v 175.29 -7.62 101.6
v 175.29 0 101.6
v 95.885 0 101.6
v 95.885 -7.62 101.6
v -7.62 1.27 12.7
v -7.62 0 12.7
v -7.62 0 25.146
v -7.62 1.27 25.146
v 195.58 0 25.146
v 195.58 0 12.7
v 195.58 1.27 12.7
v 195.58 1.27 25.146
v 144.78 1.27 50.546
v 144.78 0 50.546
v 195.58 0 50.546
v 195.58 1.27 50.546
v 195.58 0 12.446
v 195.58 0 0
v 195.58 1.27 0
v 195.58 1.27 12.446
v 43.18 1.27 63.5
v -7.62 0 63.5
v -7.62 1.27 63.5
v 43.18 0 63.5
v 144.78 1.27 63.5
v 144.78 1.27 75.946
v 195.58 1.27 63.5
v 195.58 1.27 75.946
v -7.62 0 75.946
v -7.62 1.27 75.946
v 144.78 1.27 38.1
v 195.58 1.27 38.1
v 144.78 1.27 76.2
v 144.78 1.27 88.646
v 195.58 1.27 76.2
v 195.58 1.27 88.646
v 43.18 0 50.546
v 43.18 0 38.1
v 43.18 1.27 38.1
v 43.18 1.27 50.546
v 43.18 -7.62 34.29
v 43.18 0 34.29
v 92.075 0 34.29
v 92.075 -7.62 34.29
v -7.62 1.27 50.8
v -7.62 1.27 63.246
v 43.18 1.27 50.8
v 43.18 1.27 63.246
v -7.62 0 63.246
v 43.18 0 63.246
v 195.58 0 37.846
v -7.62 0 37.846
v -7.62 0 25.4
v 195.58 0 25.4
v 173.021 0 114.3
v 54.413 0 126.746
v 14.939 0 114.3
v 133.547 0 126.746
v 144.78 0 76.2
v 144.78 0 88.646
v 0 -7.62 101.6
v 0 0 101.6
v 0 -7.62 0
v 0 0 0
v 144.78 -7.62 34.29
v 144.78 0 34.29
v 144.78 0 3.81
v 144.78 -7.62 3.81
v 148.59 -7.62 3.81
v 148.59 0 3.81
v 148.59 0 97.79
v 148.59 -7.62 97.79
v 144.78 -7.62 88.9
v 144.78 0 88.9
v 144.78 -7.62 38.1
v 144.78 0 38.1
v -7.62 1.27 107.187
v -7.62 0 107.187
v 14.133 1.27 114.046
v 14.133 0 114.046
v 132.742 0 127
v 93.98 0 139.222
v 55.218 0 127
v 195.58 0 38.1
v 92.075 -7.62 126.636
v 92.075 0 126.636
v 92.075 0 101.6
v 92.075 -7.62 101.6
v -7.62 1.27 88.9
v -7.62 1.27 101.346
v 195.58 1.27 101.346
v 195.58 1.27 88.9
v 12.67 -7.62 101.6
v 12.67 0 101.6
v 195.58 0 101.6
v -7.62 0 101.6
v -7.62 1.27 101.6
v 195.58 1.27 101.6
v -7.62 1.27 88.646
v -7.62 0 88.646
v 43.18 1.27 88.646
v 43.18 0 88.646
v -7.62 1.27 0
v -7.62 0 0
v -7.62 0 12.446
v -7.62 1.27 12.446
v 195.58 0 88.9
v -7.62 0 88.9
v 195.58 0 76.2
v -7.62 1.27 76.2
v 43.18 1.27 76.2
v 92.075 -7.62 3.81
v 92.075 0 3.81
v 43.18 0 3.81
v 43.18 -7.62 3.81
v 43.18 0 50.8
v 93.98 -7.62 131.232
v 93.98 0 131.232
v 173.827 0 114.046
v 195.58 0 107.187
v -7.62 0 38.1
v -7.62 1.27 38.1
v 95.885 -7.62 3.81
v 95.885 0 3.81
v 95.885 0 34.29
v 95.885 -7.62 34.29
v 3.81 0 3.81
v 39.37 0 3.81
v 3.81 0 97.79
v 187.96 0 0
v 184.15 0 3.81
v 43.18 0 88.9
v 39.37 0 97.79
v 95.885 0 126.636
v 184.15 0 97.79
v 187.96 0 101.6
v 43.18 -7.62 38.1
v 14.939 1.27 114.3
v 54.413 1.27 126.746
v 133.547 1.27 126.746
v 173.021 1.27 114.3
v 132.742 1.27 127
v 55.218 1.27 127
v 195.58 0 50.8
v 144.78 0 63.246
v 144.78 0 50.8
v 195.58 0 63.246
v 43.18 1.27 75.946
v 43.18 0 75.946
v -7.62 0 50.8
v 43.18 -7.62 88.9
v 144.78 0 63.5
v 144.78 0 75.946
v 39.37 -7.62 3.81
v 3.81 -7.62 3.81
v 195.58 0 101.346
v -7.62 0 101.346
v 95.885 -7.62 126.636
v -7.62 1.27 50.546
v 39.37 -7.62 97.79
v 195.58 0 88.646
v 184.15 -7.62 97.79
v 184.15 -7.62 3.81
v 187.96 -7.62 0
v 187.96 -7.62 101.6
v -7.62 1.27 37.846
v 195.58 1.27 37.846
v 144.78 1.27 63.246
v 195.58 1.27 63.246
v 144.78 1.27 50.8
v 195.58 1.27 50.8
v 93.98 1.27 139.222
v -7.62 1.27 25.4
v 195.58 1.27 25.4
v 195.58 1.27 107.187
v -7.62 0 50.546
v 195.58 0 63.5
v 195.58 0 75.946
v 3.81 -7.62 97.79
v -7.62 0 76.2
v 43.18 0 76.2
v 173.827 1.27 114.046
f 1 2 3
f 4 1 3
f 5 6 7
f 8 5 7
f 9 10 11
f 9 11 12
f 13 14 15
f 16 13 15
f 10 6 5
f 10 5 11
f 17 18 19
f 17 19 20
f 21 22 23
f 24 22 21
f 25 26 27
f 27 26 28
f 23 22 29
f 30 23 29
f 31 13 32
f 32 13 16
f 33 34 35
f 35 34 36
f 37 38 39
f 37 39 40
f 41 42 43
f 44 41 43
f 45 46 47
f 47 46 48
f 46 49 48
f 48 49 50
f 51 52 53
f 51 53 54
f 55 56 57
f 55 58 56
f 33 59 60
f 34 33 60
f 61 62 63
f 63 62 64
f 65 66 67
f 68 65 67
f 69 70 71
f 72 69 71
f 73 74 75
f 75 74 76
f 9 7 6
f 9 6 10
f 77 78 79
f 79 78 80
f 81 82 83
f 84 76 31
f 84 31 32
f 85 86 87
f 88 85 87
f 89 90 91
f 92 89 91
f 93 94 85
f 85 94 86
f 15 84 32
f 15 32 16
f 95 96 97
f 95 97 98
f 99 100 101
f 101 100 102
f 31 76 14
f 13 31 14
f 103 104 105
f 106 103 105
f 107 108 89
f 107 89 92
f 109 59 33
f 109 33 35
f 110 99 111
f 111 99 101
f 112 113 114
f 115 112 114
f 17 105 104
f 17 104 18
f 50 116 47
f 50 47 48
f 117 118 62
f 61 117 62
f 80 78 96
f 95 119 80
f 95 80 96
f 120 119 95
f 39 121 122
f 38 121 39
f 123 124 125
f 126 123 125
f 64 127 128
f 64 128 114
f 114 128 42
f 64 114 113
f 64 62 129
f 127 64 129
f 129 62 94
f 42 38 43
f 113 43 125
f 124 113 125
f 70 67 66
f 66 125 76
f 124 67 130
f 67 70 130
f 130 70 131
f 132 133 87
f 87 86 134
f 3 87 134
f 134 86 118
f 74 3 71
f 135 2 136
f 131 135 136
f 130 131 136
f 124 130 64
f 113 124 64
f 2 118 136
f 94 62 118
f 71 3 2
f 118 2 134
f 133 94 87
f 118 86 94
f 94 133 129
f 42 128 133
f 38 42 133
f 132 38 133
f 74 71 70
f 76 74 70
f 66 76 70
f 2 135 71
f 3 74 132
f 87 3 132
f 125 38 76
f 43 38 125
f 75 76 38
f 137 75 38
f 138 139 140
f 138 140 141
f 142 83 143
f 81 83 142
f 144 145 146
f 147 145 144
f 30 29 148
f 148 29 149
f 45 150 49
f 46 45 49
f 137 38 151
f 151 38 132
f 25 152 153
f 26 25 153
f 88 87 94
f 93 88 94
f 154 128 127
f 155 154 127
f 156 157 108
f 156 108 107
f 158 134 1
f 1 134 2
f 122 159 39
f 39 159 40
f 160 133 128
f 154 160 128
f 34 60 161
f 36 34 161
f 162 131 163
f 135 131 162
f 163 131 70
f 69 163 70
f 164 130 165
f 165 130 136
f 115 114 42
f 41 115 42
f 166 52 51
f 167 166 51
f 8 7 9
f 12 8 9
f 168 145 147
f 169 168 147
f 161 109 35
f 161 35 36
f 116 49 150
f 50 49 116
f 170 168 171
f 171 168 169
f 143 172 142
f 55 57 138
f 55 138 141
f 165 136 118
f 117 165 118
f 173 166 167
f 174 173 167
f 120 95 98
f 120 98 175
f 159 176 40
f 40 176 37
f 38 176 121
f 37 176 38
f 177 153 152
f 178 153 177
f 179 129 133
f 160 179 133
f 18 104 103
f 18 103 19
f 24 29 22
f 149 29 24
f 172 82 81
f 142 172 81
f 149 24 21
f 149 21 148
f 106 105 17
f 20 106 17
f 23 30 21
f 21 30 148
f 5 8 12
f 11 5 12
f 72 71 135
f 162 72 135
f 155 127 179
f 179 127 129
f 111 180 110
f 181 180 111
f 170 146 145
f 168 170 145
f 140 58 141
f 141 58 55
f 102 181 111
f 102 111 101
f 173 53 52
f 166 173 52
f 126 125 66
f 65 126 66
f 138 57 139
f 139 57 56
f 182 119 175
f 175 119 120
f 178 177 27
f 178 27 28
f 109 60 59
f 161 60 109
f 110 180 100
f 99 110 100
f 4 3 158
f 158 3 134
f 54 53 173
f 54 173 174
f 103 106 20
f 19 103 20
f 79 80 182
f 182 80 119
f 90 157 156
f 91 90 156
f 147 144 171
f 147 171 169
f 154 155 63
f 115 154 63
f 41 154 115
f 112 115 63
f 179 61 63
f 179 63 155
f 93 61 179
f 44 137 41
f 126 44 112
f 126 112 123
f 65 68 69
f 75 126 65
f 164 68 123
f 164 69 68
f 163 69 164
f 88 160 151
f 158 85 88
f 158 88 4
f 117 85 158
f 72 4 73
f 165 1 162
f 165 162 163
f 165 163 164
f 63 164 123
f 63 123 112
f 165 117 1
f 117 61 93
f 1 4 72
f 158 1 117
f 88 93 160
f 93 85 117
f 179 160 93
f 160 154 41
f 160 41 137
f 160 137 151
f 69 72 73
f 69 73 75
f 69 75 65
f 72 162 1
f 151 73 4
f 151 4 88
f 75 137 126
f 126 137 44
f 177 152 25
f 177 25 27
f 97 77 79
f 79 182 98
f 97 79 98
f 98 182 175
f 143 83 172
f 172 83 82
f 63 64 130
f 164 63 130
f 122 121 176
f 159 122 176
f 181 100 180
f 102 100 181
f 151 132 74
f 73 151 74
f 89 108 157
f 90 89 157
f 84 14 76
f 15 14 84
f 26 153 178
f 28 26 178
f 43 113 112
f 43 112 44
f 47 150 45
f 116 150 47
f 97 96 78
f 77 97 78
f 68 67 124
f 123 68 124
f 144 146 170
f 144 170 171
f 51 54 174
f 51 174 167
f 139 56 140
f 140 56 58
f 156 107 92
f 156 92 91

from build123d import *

# Parameters (mm, degrees)
F0_W     = 3.81
F0_H     = 93.98
F0_W_2   = 101.6
F0_H_2   = 3.81
F0_H_3   = 30.48
F0_H_4   = 5.08
F1_DEPTH = 7.62
F2_W     = 203.2
F2_H     = 12.446
F3_DEPTH = 1.27
F0_H_5   = 50.8
F4_DEPTH = 25.4
F6_DEPTH = 2.54


# Not quite as in the source:
# - a feature names something its author has since deleted; it is built from what else it names


with BuildPart() as f1:
    # F0 (on Front) → F1 (new body)
    with BuildSketch(Plane.XZ):
        Polygon((0, 101.6), (0, 97.79), (3.81, 97.79), (39.3699984628, 97.79), (43.18, 97.79), (144.78, 97.79), (148.59, 97.79), (184.15, 97.79), (187.96, 97.79), (187.96, 101.6), (175.2898087158, 101.6), (95.885, 101.6), (92.075, 101.6), (12.6701912842, 101.6), align=None)
        with Locations((1.905, 50.8)):
            Rectangle(F0_W, F0_H)
        Polygon((39.3699984628, 97.79), (39.3699984628, 3.81), (43.18, 3.81), (43.18, 34.29), (43.18, 38.1), (43.18, 88.9), (43.18, 92.71), (43.18, 97.79), align=None)
        with Locations((93.98, 90.805)):
            Rectangle(F0_W_2, F0_H_2)
        Polygon((144.78, 3.81), (148.59, 3.81), (148.59, 97.79), (144.78, 97.79), (144.78, 92.71), (144.78, 88.9), (144.78, 38.1), (144.78, 34.29), align=None)
        with Locations((186.055, 50.8)):
            Rectangle(F0_W, F0_H)
        Polygon((43.18, 38.1), (43.18, 34.29), (92.075, 34.29), (95.885, 34.29), (144.78, 34.29), (144.78, 38.1), align=None)
        with Locations((93.98, 19.05)):
            Rectangle(F0_W, F0_H_3)
        Polygon((0, 3.81), (0, 0), (187.96, 0), (187.96, 3.81), (184.15, 3.81), (148.59, 3.81), (144.78, 3.81), (95.885, 3.81), (92.075, 3.81), (43.18, 3.81), (39.3699984628, 3.81), (3.81, 3.81), align=None)
        Polygon((93.98, 131.2317801788), (0, 101.6), (12.6701912842, 101.6), (92.075, 126.6362400192), (93.98, 127.2368842121), (95.885, 126.6362400192), (175.2898087158, 101.6), (187.96, 101.6), align=None)
        Polygon((92.075, 126.6362400192), (92.075, 101.6), (95.885, 101.6), (95.885, 126.6362400192), (93.98, 127.2368842121), align=None)
        with Locations((93.98, 95.25)):
            Rectangle(F0_W_2, F0_H_4)
    extrude(amount=F1_DEPTH)


with BuildPart() as f3:
    # F2 (on Front) → F3 (new body)
    with BuildSketch(Plane.XZ):
        with Locations((93.98, 6.223)):
            Rectangle(F2_W, F2_H)
    extrude(amount=-F3_DEPTH)


with BuildPart() as f3b:
    # F2 (on Front) → F3, piece 2 (new body)
    with BuildSketch(Plane.XZ):
        with Locations((93.98, 18.923)):
            Rectangle(F2_W, F2_H)
    extrude(amount=-F3_DEPTH)


with BuildPart() as f3c:
    # F2 (on Front) → F3, piece 3 (new body)
    with BuildSketch(Plane.XZ):
        with Locations((93.98, 31.623)):
            Rectangle(F2_W, F2_H)
    extrude(amount=-F3_DEPTH)


with BuildPart() as f3d:
    # F2 (on Front) → F3, piece 4 (new body)
    with BuildSketch(Plane.XZ):
        with Locations((93.98, 44.323)):
            Rectangle(F2_W, F2_H)
    extrude(amount=-F3_DEPTH)


with BuildPart() as f3e:
    # F2 (on Front) → F3, piece 5 (new body)
    with BuildSketch(Plane.XZ):
        with Locations((93.98, 57.023)):
            Rectangle(F2_W, F2_H)
    extrude(amount=-F3_DEPTH)


with BuildPart() as f3f:
    # F2 (on Front) → F3, piece 6 (new body)
    with BuildSketch(Plane.XZ):
        with Locations((93.98, 69.723)):
            Rectangle(F2_W, F2_H)
    extrude(amount=-F3_DEPTH)


with BuildPart() as f3g:
    # F2 (on Front) → F3, piece 7 (new body)
    with BuildSketch(Plane.XZ):
        with Locations((93.98, 82.423)):
            Rectangle(F2_W, F2_H)
    extrude(amount=-F3_DEPTH)


with BuildPart() as f3h:
    # F2 (on Front) → F3, piece 8 (new body)
    with BuildSketch(Plane.XZ):
        with Locations((93.98, 95.123)):
            Rectangle(F2_W, F2_H)
    extrude(amount=-F3_DEPTH)


with BuildPart() as f3i:
    # F2 (on Front) → F3, piece 9 (new body)
    with BuildSketch(Plane.XZ):
        with Locations((93.98, 107.823)):
            Rectangle(F2_W, F2_H)
    extrude(amount=-F3_DEPTH)


with BuildPart() as f3j:
    # F2 (on Front) → F3, piece 10 (new body)
    with BuildSketch(Plane.XZ):
        with Locations((93.98, 120.523)):
            Rectangle(F2_W, F2_H)
    extrude(amount=-F3_DEPTH)


with BuildPart() as f3k:
    # F2 (on Front) → F3, piece 11 (new body)
    with BuildSketch(Plane.XZ):
        with Locations((93.98, 133.223)):
            Rectangle(F2_W, F2_H)
    extrude(amount=-F3_DEPTH)


with BuildPart() as f4_tool:
    # F0 (on Front) → F4 (new body)
    with BuildSketch(Plane.XZ):
        with Locations((93.98, 63.5)):
            Rectangle(F0_W_2, F0_H_5)
    extrude(amount=-F4_DEPTH)


with BuildPart() as f3d_1:
    add(f3d.part)

    # F4: cut by f4_tool
    add(f4_tool.part, mode=Mode.SUBTRACT)


with BuildPart() as f3e_1:
    add(f3e.part)

    # F4: cut by f4_tool
    add(f4_tool.part, mode=Mode.SUBTRACT)


with BuildPart() as f3f_1:
    add(f3f.part)

    # F4: cut by f4_tool
    add(f4_tool.part, mode=Mode.SUBTRACT)


with BuildPart() as f3g_1:
    add(f3g.part)

    # F4: cut by f4_tool
    add(f4_tool.part, mode=Mode.SUBTRACT)


with BuildPart() as f6_tool:
    # F5 (on Front) → F6 (new body)
    with BuildSketch(Plane.XZ):
        Polygon((-10.16, 141.605), (-10.16, 106.3863562386), (93.98, 139.2215721124), (198.12, 106.3863562386), (198.12, 141.605), align=None)
    extrude(amount=-F6_DEPTH)


with BuildPart() as f3i_1:
    add(f3i.part)

    # F6: cut by f6_tool
    add(f6_tool.part, mode=Mode.SUBTRACT)


with BuildPart() as f3j_1:
    add(f3j.part)

    # F6: cut by f6_tool
    add(f6_tool.part, mode=Mode.SUBTRACT)


with BuildPart() as f3k_1:
    add(f3k.part)

    # F6: cut by f6_tool
    add(f6_tool.part, mode=Mode.SUBTRACT)


solid = Compound([f1.part, f3.part, f3b.part, f3c.part, f3h.part, f3d_1.part, f3e_1.part, f3f_1.part, f3g_1.part, f3i_1.part, f3j_1.part, f3k_1.part])
